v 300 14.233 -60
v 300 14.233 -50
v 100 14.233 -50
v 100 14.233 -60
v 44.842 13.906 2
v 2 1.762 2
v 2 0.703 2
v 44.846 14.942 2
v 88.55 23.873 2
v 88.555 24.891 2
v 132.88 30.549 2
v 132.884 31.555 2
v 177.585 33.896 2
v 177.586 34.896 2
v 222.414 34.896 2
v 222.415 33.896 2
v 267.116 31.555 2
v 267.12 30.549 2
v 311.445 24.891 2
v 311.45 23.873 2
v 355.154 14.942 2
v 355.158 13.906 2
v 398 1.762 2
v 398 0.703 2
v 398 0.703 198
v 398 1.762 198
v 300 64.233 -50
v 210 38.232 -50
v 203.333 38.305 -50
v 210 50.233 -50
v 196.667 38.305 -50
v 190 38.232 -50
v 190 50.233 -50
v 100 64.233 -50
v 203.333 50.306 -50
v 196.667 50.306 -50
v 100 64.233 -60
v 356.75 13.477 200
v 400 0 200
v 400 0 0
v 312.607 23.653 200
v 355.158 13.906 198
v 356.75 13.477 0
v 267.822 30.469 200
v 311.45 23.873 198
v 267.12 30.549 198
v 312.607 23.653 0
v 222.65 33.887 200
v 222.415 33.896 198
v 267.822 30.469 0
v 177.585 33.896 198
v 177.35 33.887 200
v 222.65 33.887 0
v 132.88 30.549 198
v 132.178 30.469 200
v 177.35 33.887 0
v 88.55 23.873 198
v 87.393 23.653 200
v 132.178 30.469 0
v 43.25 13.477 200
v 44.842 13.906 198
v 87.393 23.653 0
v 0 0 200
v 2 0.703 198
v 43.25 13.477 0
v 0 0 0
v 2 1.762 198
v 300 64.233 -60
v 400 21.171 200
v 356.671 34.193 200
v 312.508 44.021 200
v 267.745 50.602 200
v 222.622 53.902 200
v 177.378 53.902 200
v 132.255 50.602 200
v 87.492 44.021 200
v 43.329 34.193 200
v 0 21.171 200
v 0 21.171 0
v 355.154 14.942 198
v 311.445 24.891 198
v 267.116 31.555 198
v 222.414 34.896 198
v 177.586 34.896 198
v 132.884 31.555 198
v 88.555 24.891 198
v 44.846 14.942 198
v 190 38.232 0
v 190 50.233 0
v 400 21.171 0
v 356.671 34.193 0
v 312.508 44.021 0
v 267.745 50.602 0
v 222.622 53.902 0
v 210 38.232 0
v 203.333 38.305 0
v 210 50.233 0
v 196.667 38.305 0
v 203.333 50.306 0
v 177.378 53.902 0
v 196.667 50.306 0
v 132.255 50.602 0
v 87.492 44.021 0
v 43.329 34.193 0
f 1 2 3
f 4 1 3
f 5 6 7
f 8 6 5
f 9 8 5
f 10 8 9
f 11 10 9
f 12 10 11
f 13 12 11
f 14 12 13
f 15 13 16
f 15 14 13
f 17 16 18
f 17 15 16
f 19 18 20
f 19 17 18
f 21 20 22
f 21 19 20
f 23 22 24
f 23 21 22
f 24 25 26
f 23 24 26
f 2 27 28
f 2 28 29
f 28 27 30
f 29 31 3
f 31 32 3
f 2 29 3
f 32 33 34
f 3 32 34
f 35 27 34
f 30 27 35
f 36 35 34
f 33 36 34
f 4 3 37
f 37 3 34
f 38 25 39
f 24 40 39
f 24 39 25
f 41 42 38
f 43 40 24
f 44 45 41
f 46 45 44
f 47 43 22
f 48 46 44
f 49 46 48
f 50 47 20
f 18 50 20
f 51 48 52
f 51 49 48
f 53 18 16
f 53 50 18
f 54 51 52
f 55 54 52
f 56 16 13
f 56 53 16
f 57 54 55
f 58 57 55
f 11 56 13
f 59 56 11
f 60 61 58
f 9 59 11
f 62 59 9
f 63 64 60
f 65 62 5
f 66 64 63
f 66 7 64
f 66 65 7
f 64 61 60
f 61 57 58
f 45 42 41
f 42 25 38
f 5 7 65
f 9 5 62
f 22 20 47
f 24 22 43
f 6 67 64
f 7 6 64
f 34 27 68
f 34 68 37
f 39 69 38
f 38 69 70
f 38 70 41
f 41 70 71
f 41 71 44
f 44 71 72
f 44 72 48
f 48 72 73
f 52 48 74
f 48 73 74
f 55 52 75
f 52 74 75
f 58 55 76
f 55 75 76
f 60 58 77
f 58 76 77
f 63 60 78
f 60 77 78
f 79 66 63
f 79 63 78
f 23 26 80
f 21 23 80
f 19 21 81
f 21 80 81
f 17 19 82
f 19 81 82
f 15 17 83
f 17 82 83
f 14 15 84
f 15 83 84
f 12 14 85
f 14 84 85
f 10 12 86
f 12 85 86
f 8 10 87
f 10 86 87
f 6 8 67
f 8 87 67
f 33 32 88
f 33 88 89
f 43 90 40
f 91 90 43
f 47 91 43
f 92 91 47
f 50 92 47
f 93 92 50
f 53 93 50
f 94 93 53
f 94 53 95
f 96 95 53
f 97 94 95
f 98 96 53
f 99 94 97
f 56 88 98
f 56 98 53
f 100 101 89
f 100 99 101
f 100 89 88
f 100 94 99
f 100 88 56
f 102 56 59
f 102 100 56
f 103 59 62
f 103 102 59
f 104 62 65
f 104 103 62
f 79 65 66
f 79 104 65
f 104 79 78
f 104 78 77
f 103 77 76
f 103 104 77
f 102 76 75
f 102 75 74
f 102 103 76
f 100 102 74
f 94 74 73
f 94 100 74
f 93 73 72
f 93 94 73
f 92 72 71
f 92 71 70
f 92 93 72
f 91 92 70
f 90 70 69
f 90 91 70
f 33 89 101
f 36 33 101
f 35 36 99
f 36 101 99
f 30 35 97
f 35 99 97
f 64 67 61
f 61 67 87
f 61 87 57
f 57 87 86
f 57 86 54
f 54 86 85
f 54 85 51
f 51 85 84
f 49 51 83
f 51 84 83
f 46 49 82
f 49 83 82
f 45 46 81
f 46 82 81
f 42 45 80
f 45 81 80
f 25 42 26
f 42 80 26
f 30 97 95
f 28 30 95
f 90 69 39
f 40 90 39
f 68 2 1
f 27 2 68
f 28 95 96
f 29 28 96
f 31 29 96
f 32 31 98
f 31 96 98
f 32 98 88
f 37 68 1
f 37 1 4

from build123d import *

# Parameters (mm, degrees)
BOSS_EXTRUDE1_DEPTH = 200
CUT_EXTRUDE1_START  = -2
CUT_EXTRUDE1_DEPTH  = 196
BOSS_EXTRUDE3_DEPTH = 50
SKETCH6_W           = 200
SKETCH6_H           = 50
BOSS_EXTRUDE4_DEPTH = 10


with BuildPart() as part:
    # Sketch1 → Boss-Extrude1 (new body)
    with BuildSketch(Plane.XY):
        with BuildLine():
            Line((0, 0), (0, 21.170605096))
            ThreePointArc((0, 21.170605096), (200, 54.314575051), (400, 21.170605096))
            Line((400, 21.170605096), (400, 0))
            ThreePointArc((400, 0), (200, 34.314575051), (0, 0))
        make_face()
    extrude(amount=BOSS_EXTRUDE1_DEPTH)

    # Sketch3 → Cut-Extrude1 (cut)
    with BuildSketch(Plane.XY.offset(200).offset(CUT_EXTRUDE1_START)):
        with BuildLine():
            Line((2, 1.762370006), (2, 0.703134257))
            ThreePointArc((2, 0.703134257), (200, 34.314575051), (398, 0.703134257))
            Line((398, 0.703134257), (398, 1.762370006))
            ThreePointArc((398, 1.762370006), (200, 35.314575051), (2, 1.762370006))
        make_face()
    extrude(amount=-CUT_EXTRUDE1_DEPTH, mode=Mode.SUBTRACT)

    # Sketch5 → Boss-Extrude3 (add)
    with BuildSketch(Plane(origin=(0, 0, 0), x_dir=(-1, 0, 0), z_dir=(0, 0, -1))):
        with BuildLine():
            Line((-210, 50.233400871), (-210, 38.23178792))
            ThreePointArc((-210, 38.23178792), (-200, 38.314575051), (-190, 38.23178792))
            Line((-190, 38.23178792), (-190, 50.233400871))
            ThreePointArc((-190, 50.233400871), (-200, 50.314575051), (-210, 50.233400871))
        make_face()
    extrude(amount=BOSS_EXTRUDE3_DEPTH)

    # Sketch6 → Boss-Extrude4 (add)
    with BuildSketch(Plane(origin=(0, 0, -50), x_dir=(-1, 0, 0), z_dir=(0, 0, -1))):
        with Locations((-200, 39.232594396)):
            Rectangle(SKETCH6_W, SKETCH6_H)
    extrude(amount=BOSS_EXTRUDE4_DEPTH)


solid = part.part
